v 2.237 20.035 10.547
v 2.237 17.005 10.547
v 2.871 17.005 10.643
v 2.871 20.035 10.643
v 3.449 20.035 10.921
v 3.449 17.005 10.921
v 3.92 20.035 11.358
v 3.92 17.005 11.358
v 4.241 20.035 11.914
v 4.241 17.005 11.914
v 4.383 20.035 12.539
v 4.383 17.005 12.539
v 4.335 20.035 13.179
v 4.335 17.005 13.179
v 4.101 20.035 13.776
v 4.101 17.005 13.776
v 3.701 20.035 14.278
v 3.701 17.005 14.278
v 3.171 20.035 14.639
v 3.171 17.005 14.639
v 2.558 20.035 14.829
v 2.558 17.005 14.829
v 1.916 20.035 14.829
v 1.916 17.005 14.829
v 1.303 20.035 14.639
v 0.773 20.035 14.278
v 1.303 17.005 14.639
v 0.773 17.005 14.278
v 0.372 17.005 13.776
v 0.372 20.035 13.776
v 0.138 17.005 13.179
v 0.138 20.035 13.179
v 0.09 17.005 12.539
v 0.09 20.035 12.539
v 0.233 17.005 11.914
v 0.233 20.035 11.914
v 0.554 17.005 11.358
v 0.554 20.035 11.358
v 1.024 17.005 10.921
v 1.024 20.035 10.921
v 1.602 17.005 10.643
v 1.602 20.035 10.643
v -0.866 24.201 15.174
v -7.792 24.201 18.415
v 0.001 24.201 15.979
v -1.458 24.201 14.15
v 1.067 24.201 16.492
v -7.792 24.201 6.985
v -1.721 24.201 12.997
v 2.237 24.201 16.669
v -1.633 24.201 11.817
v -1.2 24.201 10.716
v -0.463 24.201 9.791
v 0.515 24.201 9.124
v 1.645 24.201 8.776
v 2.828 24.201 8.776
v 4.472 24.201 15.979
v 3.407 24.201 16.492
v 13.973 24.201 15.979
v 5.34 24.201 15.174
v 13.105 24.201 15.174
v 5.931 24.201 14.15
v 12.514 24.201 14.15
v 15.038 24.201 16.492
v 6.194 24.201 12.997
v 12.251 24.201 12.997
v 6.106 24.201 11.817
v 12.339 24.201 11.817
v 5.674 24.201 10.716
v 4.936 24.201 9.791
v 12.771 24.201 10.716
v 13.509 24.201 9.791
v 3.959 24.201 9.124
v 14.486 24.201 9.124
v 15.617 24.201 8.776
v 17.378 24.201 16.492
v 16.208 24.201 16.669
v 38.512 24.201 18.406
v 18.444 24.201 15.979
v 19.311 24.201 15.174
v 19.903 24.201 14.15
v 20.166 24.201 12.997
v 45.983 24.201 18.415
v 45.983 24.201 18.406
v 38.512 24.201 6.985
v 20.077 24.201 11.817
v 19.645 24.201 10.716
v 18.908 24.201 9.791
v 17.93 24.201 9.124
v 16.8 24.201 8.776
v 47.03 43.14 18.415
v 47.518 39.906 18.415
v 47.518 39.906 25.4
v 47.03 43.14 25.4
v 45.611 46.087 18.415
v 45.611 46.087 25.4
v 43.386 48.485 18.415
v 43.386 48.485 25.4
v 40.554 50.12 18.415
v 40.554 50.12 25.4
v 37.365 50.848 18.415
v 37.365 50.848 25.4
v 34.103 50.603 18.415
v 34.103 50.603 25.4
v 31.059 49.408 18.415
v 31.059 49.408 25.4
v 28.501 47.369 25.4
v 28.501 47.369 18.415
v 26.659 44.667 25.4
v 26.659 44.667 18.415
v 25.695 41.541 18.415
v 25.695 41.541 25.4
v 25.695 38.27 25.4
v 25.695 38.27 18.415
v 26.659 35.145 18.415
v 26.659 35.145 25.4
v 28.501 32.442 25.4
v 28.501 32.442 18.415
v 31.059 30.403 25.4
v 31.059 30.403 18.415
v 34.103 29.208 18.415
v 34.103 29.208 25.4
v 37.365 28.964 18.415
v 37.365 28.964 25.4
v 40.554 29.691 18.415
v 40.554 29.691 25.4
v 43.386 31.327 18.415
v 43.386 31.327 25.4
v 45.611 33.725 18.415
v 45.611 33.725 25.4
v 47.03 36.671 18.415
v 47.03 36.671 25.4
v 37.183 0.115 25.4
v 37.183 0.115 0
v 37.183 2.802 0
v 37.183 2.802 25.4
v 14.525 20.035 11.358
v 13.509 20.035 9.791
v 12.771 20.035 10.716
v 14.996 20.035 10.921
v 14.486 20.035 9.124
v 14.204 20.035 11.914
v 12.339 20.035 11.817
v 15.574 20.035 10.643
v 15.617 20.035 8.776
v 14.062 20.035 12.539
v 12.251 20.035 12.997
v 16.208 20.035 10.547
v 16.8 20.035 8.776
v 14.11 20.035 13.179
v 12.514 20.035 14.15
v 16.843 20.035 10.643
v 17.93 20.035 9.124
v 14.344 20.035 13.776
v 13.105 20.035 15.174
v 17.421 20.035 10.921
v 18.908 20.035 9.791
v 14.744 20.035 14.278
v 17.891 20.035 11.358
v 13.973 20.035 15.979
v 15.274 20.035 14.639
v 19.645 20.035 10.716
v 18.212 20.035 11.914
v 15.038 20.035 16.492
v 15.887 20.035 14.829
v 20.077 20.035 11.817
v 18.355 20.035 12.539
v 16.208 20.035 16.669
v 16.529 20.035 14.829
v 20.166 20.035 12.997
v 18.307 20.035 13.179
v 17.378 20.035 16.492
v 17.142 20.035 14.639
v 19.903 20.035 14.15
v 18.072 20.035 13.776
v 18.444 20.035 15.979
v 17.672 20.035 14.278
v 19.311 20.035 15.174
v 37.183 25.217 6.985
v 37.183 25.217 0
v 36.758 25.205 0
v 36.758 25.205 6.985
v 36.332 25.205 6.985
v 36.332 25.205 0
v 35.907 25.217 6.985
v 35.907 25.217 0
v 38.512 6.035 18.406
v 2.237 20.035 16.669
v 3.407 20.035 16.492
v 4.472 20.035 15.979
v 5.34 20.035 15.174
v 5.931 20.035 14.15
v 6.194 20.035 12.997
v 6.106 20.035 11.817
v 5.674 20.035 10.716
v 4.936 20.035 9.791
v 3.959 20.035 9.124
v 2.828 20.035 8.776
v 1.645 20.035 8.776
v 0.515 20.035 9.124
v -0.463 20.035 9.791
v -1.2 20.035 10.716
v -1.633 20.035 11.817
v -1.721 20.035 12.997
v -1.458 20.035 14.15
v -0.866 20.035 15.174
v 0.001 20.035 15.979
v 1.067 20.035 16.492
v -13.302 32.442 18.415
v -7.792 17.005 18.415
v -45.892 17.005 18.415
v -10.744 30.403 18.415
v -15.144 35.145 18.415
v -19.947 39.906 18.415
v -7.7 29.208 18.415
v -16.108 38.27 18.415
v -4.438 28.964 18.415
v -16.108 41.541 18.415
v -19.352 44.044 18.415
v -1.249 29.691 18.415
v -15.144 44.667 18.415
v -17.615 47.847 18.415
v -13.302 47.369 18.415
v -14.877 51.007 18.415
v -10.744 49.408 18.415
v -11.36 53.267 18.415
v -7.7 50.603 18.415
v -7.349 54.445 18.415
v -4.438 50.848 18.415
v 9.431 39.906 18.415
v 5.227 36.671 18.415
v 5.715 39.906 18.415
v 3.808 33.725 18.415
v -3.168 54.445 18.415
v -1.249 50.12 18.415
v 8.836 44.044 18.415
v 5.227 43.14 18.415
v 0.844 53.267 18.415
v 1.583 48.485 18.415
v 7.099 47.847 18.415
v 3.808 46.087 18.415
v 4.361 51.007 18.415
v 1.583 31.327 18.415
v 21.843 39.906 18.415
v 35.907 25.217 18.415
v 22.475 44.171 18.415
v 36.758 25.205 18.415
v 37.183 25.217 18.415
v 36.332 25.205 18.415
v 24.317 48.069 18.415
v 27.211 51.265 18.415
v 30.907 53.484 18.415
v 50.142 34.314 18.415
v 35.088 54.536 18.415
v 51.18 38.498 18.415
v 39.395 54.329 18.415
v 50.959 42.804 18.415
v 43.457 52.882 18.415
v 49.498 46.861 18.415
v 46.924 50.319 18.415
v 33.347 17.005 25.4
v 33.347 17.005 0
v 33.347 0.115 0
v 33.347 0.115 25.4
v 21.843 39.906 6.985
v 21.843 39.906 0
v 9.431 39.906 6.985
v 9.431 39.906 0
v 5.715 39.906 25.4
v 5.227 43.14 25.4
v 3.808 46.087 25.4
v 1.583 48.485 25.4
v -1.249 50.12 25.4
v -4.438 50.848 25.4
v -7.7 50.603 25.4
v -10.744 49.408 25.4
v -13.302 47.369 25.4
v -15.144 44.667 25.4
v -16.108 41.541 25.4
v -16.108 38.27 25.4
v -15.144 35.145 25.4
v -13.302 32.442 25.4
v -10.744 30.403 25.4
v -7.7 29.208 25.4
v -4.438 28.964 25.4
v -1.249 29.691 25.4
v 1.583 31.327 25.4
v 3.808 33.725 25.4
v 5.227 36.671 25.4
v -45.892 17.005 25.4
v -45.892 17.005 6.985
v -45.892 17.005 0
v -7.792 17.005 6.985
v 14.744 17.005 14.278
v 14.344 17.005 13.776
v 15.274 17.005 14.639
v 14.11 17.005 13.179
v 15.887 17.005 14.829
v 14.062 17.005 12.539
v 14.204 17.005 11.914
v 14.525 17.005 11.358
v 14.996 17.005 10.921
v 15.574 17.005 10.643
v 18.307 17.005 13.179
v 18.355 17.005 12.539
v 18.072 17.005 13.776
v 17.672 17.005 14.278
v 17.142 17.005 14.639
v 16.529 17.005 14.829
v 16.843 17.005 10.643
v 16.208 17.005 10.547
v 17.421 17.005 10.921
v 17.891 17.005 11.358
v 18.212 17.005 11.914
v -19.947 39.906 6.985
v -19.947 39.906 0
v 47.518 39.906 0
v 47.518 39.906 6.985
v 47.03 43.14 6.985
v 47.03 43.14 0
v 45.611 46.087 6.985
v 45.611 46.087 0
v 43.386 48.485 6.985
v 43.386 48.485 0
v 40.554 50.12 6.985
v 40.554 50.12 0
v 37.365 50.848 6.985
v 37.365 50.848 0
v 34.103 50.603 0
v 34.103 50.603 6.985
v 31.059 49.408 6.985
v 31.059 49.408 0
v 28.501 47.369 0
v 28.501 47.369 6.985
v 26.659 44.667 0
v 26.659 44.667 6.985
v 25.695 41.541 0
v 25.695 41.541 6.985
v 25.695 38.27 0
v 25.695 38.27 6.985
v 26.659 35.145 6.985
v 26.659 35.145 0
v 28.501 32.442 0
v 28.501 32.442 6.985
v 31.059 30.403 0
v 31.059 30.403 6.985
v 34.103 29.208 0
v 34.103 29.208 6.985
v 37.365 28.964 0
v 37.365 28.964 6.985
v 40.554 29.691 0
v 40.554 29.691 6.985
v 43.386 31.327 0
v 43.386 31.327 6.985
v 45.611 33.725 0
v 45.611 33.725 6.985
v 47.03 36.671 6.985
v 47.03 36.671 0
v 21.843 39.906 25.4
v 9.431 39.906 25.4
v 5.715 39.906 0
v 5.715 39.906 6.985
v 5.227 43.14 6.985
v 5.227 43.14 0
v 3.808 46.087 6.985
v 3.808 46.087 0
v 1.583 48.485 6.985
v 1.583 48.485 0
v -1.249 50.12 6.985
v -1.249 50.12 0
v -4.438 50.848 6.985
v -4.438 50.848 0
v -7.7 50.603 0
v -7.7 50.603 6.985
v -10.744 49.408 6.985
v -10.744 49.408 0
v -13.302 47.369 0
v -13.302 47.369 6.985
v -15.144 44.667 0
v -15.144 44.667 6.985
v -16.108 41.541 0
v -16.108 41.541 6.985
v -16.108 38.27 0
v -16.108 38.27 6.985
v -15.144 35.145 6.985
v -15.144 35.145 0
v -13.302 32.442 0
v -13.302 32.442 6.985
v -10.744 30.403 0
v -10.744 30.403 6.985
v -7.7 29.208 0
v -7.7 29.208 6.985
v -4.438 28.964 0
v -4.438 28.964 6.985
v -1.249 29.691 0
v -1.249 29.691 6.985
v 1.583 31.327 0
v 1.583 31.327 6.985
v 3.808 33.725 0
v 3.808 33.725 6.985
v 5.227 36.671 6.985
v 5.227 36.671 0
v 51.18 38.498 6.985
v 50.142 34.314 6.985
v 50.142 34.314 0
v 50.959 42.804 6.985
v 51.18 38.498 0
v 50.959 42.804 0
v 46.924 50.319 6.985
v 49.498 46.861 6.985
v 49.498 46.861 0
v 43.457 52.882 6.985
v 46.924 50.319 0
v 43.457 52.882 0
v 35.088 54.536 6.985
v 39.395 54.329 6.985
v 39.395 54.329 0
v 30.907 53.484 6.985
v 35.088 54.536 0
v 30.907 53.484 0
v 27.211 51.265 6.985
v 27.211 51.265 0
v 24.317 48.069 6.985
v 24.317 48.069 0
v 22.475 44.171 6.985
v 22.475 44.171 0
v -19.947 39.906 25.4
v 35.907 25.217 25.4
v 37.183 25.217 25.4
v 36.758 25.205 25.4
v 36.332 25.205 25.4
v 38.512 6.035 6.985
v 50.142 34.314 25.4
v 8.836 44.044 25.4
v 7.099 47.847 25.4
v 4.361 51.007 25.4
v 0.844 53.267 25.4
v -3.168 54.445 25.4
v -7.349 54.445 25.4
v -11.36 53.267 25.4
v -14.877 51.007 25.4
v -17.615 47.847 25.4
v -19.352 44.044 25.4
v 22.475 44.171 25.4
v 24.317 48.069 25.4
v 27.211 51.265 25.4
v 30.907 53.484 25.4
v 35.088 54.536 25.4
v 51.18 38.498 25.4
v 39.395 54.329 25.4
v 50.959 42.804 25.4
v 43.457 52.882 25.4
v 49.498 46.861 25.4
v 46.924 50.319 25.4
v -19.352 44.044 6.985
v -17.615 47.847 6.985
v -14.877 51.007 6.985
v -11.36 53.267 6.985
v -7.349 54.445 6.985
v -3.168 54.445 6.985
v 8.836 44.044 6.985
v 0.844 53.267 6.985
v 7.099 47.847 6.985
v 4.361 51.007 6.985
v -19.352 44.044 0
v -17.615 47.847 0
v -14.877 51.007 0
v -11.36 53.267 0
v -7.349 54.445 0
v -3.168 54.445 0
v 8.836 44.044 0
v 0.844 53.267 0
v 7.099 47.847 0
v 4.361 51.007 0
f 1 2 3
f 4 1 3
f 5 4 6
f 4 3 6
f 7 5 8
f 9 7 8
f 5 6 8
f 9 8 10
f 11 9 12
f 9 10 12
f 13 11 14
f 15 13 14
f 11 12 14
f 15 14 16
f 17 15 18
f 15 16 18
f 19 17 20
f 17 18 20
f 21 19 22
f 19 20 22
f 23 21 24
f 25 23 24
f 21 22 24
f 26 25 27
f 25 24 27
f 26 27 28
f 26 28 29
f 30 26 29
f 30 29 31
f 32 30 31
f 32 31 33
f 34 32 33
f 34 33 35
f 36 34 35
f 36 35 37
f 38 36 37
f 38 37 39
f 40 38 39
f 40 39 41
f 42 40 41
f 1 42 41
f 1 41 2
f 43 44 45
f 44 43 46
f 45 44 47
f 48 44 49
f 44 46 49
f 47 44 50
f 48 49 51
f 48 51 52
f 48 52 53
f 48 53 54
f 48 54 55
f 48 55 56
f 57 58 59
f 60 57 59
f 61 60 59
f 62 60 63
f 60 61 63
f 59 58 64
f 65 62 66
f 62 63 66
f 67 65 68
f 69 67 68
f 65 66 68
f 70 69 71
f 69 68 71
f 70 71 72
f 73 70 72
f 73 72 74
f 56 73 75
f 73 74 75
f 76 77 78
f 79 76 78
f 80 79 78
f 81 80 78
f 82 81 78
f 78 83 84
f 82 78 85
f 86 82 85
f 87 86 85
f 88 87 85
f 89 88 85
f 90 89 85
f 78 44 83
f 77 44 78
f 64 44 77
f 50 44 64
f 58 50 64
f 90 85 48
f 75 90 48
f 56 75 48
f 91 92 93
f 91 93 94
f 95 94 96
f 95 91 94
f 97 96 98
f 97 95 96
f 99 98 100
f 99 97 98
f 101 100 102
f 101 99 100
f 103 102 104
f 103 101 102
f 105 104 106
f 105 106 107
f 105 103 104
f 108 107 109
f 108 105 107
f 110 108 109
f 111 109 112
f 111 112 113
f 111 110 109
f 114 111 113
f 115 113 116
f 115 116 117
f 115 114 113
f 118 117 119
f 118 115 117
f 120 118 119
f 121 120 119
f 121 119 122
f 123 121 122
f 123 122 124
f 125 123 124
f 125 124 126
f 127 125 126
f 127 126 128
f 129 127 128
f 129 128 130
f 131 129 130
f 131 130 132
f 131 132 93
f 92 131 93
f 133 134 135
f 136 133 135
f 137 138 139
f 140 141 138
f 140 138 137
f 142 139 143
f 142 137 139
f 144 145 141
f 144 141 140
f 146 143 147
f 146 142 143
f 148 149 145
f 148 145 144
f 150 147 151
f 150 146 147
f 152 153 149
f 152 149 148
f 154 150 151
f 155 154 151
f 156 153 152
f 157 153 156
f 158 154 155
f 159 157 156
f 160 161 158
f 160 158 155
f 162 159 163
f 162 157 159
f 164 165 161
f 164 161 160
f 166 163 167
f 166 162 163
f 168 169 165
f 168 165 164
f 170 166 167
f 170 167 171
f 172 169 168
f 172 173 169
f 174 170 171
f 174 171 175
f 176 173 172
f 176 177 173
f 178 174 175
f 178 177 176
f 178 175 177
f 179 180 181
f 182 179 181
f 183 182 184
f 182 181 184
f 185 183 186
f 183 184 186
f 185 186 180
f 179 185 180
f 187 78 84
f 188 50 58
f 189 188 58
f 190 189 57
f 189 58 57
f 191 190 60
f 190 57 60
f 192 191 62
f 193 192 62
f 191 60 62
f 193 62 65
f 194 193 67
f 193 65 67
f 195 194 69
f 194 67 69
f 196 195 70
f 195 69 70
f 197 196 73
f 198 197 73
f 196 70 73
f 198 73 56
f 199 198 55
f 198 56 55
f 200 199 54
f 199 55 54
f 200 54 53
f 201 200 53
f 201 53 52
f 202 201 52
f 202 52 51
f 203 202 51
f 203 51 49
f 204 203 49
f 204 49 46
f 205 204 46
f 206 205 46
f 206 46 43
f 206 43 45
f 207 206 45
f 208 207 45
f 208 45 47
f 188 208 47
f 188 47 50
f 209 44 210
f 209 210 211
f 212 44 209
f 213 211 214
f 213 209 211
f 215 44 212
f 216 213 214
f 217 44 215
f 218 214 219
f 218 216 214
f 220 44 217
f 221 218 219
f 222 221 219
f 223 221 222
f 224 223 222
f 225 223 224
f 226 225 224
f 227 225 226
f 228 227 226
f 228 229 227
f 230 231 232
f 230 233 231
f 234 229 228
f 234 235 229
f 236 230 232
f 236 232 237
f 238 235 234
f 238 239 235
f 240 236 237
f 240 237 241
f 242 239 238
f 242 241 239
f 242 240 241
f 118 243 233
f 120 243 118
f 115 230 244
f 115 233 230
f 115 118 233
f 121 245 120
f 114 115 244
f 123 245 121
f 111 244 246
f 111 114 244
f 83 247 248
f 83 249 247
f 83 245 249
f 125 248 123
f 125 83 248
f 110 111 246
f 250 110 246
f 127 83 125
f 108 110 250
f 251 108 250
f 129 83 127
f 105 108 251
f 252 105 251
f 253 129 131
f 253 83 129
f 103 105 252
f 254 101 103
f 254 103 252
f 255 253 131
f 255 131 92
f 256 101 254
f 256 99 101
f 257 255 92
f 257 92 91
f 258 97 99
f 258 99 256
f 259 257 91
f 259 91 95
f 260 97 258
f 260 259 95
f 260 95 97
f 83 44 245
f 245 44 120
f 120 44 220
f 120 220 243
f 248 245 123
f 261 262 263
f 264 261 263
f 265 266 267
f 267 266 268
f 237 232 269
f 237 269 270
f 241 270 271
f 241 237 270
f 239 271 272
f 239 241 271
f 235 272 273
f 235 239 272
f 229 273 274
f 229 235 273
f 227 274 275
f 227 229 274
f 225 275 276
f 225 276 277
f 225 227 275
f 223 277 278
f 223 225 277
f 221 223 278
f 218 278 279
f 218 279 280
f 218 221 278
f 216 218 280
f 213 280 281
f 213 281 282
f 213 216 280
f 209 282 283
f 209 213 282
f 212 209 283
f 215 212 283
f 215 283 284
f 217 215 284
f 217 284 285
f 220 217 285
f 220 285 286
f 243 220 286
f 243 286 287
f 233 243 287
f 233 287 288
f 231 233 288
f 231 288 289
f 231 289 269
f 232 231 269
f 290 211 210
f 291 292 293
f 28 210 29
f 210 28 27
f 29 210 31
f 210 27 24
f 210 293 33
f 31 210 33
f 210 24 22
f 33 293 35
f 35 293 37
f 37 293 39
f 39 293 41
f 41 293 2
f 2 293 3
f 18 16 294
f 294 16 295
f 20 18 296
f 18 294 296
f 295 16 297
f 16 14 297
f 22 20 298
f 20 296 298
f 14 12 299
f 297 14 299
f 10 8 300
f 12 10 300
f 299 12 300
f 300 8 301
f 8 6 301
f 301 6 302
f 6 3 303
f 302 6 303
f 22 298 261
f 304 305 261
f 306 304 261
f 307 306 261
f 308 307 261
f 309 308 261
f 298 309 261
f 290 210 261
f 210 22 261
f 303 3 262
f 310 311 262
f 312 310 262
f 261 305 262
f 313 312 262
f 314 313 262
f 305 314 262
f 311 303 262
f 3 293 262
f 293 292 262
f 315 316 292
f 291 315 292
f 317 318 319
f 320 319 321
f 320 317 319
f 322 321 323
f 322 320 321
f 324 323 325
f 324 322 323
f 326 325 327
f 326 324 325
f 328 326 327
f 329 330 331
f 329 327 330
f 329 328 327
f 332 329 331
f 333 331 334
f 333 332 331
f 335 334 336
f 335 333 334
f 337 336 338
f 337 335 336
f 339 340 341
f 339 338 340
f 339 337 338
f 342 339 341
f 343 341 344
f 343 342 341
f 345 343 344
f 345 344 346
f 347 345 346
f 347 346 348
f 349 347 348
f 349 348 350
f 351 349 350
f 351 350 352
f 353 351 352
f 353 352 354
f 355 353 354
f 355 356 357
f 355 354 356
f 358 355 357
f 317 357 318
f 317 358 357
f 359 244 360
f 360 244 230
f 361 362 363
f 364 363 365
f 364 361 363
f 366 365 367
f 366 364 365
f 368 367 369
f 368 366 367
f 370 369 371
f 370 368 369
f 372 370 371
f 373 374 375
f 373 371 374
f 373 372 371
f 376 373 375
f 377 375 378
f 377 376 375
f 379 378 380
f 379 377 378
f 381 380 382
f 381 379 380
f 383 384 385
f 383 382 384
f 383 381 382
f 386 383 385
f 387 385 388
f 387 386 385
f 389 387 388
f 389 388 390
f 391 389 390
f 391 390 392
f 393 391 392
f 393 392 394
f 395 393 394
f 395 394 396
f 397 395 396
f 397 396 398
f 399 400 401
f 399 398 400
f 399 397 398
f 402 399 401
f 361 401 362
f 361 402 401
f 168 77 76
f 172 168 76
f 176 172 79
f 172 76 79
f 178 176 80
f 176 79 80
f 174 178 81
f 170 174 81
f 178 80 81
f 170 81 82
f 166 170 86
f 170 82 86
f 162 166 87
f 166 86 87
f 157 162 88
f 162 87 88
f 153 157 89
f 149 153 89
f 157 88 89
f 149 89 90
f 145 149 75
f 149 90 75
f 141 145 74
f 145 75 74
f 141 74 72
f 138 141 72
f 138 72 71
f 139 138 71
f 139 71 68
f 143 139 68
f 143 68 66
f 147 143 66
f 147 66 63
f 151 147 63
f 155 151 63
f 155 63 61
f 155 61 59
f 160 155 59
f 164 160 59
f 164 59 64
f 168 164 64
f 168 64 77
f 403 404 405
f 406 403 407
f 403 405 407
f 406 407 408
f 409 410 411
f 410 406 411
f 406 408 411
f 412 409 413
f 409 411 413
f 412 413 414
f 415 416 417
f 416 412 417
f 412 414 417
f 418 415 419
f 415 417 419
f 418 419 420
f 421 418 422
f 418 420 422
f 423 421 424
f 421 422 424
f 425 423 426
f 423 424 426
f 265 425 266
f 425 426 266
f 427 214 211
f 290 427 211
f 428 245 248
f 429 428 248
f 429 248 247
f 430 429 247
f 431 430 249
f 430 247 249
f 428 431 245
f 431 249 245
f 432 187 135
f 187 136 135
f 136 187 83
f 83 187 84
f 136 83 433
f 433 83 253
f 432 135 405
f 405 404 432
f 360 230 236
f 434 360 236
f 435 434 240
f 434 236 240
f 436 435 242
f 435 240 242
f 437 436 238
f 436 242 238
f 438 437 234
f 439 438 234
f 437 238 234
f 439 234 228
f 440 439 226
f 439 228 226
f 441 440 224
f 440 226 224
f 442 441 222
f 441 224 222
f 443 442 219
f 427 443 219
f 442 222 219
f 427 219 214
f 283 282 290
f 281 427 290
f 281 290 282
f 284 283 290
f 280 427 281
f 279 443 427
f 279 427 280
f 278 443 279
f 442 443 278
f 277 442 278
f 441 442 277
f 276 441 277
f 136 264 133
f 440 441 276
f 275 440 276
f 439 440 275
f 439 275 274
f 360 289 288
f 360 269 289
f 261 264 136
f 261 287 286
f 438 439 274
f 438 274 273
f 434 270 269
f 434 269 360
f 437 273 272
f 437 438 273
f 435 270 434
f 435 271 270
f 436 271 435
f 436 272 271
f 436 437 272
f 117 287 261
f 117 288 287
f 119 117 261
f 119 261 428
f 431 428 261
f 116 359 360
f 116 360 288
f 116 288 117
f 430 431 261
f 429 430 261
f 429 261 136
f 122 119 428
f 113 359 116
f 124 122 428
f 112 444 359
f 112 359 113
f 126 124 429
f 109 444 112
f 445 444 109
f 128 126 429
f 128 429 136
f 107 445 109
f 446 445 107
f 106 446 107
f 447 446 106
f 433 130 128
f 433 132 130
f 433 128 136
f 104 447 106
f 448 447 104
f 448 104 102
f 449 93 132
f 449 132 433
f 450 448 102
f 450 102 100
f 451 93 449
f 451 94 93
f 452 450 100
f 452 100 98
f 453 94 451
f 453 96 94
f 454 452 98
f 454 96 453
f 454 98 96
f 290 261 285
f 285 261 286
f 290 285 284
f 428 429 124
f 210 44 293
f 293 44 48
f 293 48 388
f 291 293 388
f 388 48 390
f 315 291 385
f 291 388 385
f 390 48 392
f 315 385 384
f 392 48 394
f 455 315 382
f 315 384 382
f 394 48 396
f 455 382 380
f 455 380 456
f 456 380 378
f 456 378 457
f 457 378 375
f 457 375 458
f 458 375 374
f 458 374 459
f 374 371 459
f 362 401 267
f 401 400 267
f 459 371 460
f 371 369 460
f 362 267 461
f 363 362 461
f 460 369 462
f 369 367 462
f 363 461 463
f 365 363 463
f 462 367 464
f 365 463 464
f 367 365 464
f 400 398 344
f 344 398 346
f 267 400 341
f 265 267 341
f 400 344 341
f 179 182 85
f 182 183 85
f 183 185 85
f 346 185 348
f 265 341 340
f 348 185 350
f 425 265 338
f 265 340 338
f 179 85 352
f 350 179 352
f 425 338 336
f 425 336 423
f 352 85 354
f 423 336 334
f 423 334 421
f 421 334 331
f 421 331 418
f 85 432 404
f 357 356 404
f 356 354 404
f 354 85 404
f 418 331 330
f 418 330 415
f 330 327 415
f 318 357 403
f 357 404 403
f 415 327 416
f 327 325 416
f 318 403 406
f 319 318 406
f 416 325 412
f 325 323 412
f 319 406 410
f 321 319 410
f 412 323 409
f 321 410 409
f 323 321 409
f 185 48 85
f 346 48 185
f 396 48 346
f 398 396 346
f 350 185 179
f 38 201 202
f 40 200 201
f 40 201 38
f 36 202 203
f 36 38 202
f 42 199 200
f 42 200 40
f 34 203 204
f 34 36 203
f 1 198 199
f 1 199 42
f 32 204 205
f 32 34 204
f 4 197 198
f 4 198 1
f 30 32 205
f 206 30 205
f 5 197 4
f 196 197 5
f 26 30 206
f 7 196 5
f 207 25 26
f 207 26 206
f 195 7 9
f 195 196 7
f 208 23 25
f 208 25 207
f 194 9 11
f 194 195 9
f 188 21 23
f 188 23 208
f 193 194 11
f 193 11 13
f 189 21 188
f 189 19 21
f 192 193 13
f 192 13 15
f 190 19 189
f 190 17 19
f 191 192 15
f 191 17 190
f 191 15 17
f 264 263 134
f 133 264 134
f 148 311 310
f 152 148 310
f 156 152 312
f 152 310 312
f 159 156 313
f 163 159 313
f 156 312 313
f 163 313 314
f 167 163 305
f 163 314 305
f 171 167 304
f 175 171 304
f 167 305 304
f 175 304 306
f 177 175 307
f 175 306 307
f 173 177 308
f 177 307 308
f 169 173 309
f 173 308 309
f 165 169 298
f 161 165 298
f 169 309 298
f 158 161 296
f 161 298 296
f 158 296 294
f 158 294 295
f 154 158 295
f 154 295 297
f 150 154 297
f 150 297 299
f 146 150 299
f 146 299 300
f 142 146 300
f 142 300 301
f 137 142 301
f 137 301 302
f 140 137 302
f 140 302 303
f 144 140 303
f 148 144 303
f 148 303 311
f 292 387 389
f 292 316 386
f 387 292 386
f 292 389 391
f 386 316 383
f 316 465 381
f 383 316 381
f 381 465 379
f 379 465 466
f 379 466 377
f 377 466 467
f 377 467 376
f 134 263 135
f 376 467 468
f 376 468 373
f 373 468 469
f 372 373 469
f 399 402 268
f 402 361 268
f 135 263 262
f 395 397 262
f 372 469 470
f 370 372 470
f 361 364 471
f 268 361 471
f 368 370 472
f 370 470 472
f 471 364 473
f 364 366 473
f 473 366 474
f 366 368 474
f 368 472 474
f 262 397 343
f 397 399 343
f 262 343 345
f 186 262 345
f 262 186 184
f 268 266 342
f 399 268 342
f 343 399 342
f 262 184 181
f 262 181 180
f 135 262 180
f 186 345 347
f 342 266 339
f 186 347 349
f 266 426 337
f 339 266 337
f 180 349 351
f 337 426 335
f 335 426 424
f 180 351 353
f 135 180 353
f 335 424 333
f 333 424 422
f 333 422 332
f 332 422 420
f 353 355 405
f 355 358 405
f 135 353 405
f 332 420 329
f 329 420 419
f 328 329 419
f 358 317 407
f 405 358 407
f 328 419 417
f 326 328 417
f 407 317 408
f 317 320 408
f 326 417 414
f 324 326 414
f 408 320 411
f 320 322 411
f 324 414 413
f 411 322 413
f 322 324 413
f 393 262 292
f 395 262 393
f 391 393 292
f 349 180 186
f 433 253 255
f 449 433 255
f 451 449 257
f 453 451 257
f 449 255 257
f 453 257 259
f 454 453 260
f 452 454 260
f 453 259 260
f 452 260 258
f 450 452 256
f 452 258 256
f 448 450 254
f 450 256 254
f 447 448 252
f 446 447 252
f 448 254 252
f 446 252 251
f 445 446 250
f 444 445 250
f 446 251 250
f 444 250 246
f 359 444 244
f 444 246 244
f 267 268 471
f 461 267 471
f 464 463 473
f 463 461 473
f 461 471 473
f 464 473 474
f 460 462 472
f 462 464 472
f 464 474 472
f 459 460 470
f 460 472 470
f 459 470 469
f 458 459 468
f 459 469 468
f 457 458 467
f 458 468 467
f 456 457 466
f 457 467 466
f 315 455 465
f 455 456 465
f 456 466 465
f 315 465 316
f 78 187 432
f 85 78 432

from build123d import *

# Parameters (mm, degrees)
SKETCH1_R                                      = 10.9728
BOSS_EXTRUDE1_DEPTH                            = 25.4
SKETCH2_W                                      = 11.43
SKETCH2_H                                      = 30.40742991
CUT_EXTRUDE1_DEPTH                             = 63.5
CBORE_FOR_8_SOCKET_HEAD_CAP_SCREW2_D           = 4.3053
CBORE_FOR_8_SOCKET_HEAD_CAP_SCREW2_DEPTH       = 7.19576864
CBORE_FOR_8_SOCKET_HEAD_CAP_SCREW2_CBORE_D     = 7.9375
CBORE_FOR_8_SOCKET_HEAD_CAP_SCREW2_CBORE_DEPTH = 4.1656
SKETCH6_W                                      = 7.470933486
SKETCH6_H                                      = 11.420765966
CUT_EXTRUDE2_DEPTH                             = 63.5
SKETCH9_W                                      = 11.43
SKETCH9_H                                      = 7.19576864
CUT_EXTRUDE3_DEPTH                             = 38.1


with BuildPart() as part:
    # Sketch1 → Boss-Extrude1 (new body)
    with BuildSketch(Plane.XY):
        with BuildLine():
            Line((37.182732387, 0.114888998), (37.182732387, 2.802342002))
            Line((37.182732387, 2.802342002), (50.142253344, 34.313558963))
            ThreePointArc((50.142253344, 34.313558963), (39.395041388, 54.329173661), (21.842526976, 39.905698546))
            Line((21.842526976, 39.905698546), (9.430821913, 39.905698546))
            ThreePointArc((9.430821913, 39.905698546), (-5.258087214, 54.594607673), (-19.946996342, 39.905698546))
            Line((-19.946996342, 39.905698546), (-45.891553328, 17.0048778))
            Line((-45.891553328, 17.0048778), (33.346811678, 17.0048778))
            Line((33.346811678, 17.0048778), (33.346811678, 0.114888998))
            Line((33.346811678, 0.114888998), (37.182732387, 0.114888998))
        make_face()
        with BuildLine():
            Line((35.907077172, 25.217162573), (37.182732387, 25.217162573))
            ThreePointArc((37.182732387, 25.217162573), (36.54490478, 25.203320742), (35.907077172, 25.217162573))
        make_face(mode=Mode.SUBTRACT)
        with Locations((-5.258087214, 39.905698546)):
            Circle(SKETCH1_R, mode=Mode.SUBTRACT)
        with Locations((36.54490478, 39.905698546)):
            Circle(SKETCH1_R, mode=Mode.SUBTRACT)
    extrude(amount=BOSS_EXTRUDE1_DEPTH)

    # Sketch2 → Cut-Extrude1 (cut, symmetric)
    with BuildSketch(Plane(origin=(0, 0, 0), x_dir=(0, 0, -1), z_dir=(1, 0, 0))):
        with Locations((-12.7, 39.404361395)):
            Rectangle(SKETCH2_W, SKETCH2_H)
    extrude(amount=CUT_EXTRUDE1_DEPTH, both=True, mode=Mode.SUBTRACT)

    # CBORE for #8 Socket Head Cap Screw2
    with Locations(Plane(origin=(2.23670917, 24.20064644, 12.7), x_dir=(0, 0, 1), z_dir=(0, 1, 0))):
        with Locations((0, 0), (0, 13.971505139)):
            CounterBoreHole(CBORE_FOR_8_SOCKET_HEAD_CAP_SCREW2_D / 2, CBORE_FOR_8_SOCKET_HEAD_CAP_SCREW2_CBORE_D / 2, CBORE_FOR_8_SOCKET_HEAD_CAP_SCREW2_CBORE_DEPTH, depth=CBORE_FOR_8_SOCKET_HEAD_CAP_SCREW2_DEPTH)

    # Sketch6 → Cut-Extrude2 (cut, symmetric)
    with BuildSketch(Plane(origin=(0, 24.20064644, 0), x_dir=(1, 0, 0), z_dir=(0, 1, 0))):
        with Locations((42.247680275, -12.695382983)):
            Rectangle(SKETCH6_W, SKETCH6_H)
    extrude(amount=CUT_EXTRUDE2_DEPTH, both=True, mode=Mode.SUBTRACT)

    # Sketch9 → Cut-Extrude3 (cut)
    with BuildSketch(Plane(origin=(-45.891553328, 0, 0), x_dir=(0, 0, -1), z_dir=(1, 0, 0))):
        with Locations((-12.7, 20.60276212)):
            Rectangle(SKETCH9_W, SKETCH9_H)
    extrude(amount=CUT_EXTRUDE3_DEPTH, mode=Mode.SUBTRACT)


solid = part.part
